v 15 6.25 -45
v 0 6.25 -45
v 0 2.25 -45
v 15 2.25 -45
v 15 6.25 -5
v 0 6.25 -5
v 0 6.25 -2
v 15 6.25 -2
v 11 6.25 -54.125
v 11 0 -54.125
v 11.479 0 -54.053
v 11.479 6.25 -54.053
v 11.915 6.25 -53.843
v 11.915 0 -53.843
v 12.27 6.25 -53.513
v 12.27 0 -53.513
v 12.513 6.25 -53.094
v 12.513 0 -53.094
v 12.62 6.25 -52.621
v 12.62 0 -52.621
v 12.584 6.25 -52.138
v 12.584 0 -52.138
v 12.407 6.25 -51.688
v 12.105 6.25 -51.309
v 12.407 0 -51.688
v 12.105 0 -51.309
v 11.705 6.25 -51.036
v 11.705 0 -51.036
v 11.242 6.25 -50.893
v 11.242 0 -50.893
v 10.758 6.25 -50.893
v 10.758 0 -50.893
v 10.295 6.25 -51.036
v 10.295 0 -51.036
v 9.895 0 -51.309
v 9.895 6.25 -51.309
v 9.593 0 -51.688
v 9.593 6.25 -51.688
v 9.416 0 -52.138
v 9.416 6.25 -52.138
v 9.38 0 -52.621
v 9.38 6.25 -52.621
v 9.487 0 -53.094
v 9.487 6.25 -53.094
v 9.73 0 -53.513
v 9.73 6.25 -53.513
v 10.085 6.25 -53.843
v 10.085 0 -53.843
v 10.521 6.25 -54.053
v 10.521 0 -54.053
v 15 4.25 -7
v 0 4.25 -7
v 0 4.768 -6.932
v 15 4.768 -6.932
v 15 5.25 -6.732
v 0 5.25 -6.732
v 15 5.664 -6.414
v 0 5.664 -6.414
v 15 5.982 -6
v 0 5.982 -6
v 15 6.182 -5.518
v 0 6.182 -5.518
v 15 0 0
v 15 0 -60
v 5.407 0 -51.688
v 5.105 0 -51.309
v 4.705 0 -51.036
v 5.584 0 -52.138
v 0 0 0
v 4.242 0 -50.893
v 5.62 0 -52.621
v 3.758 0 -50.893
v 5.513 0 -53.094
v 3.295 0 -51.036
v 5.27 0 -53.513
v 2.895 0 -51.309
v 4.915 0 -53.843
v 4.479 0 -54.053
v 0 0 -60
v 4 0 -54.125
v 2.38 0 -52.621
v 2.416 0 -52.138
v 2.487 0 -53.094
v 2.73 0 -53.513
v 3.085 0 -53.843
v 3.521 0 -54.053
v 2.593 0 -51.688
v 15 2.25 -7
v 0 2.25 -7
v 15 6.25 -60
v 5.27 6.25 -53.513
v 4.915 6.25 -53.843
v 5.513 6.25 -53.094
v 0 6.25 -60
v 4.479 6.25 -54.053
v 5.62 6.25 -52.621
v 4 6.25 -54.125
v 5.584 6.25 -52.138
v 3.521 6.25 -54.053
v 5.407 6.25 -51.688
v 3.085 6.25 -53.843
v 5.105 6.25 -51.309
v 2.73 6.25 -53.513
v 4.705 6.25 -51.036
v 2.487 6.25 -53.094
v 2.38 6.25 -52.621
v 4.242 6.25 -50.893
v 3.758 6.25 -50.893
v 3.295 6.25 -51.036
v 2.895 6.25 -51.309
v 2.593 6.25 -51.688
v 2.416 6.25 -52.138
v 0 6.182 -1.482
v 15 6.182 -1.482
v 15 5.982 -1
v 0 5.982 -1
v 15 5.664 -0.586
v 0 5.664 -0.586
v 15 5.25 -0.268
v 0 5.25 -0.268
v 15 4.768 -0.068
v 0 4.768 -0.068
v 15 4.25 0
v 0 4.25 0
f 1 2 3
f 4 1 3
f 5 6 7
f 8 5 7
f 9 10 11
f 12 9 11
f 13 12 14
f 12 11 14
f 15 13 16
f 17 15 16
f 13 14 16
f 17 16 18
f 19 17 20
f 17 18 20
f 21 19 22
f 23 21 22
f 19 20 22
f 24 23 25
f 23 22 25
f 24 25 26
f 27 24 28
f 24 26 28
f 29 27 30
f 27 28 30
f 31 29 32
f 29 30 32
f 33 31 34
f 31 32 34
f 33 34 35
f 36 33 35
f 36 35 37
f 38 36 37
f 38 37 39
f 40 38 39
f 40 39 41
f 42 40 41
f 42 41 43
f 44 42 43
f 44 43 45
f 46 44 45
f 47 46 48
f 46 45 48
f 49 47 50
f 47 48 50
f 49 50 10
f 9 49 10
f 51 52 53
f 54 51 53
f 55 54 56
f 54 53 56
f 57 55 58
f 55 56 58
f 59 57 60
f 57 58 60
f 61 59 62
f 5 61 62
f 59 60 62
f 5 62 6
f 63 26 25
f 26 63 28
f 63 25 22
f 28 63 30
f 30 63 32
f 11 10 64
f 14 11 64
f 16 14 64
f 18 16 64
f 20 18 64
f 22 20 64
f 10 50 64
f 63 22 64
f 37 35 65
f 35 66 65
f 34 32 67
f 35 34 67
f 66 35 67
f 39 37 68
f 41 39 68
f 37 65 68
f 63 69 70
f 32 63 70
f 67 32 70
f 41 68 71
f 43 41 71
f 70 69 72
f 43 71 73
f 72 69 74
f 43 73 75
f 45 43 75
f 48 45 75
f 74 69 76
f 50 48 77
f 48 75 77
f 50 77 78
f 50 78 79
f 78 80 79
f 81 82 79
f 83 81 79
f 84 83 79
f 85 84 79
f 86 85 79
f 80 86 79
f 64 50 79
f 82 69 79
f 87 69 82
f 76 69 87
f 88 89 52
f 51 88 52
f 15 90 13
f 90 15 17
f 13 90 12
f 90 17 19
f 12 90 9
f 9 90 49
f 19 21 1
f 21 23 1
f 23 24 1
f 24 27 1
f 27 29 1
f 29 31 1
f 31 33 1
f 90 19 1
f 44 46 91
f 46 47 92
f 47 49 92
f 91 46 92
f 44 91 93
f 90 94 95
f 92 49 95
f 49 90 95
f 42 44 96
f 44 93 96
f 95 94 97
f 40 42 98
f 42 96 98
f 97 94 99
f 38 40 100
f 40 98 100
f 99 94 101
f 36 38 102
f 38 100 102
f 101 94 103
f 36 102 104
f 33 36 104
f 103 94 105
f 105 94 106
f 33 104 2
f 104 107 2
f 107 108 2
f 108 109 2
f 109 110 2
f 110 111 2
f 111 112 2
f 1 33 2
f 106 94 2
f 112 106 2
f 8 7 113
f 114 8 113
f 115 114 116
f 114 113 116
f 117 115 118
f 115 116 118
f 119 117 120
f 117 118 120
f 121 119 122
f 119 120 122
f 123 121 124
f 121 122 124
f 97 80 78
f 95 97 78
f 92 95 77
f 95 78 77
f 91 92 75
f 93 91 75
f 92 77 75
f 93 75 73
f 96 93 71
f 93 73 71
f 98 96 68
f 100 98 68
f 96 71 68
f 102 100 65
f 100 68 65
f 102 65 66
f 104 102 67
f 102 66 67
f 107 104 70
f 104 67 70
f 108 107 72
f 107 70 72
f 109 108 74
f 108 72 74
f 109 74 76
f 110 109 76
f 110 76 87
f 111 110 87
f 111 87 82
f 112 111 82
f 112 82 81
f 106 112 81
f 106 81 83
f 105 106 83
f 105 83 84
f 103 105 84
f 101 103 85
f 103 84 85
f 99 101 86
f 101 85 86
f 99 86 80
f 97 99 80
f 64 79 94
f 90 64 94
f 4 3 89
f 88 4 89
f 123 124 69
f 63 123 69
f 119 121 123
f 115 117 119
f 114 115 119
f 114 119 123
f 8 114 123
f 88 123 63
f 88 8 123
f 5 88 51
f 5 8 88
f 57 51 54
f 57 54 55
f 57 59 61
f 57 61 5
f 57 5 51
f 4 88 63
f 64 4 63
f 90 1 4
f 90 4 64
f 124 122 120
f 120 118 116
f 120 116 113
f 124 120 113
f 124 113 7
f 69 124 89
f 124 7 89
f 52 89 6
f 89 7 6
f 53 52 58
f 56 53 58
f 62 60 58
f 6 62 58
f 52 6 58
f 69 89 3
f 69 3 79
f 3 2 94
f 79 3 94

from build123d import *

# Parameters (mm, degrees)
BOSS_EXTRUDE1_DEPTH = 15
SKETCH2_R           = 1.625
CUT_EXTRUDE1_DEPTH  = 6.25


with BuildPart() as part:
    # Sketch1 → Boss-Extrude1 (new body)
    with BuildSketch(Plane(origin=(0, 0, 0), x_dir=(0, 0, -1), z_dir=(1, 0, 0))):
        with BuildLine():
            Line((0, 4.25), (0, 0))
            Line((0, 0), (60, 0))
            Line((60, 0), (60, 6.25))
            Line((60, 6.25), (45, 6.25))
            Line((45, 6.25), (45, 2.25))
            Line((45, 2.25), (7, 2.25))
            Line((7, 2.25), (7, 4.25))
            ThreePointArc((7, 4.25), (6.414213562, 5.664213562), (5, 6.25))
            Line((5, 6.25), (2, 6.25))
            ThreePointArc((2, 6.25), (0.585786438, 5.664213562), (0, 4.25))
        make_face()
    extrude(amount=BOSS_EXTRUDE1_DEPTH)

    # Sketch2 → Cut-Extrude1 (cut)
    with BuildSketch(Plane.XZ):
        with Locations(Location((11, -52.5, 0), (0, 0, 270))):
            Circle(SKETCH2_R)
        with Locations(Location((4, -52.5, 0), (0, 0, 270))):
            Circle(SKETCH2_R)
    extrude(amount=-CUT_EXTRUDE1_DEPTH, mode=Mode.SUBTRACT)


solid = part.part
